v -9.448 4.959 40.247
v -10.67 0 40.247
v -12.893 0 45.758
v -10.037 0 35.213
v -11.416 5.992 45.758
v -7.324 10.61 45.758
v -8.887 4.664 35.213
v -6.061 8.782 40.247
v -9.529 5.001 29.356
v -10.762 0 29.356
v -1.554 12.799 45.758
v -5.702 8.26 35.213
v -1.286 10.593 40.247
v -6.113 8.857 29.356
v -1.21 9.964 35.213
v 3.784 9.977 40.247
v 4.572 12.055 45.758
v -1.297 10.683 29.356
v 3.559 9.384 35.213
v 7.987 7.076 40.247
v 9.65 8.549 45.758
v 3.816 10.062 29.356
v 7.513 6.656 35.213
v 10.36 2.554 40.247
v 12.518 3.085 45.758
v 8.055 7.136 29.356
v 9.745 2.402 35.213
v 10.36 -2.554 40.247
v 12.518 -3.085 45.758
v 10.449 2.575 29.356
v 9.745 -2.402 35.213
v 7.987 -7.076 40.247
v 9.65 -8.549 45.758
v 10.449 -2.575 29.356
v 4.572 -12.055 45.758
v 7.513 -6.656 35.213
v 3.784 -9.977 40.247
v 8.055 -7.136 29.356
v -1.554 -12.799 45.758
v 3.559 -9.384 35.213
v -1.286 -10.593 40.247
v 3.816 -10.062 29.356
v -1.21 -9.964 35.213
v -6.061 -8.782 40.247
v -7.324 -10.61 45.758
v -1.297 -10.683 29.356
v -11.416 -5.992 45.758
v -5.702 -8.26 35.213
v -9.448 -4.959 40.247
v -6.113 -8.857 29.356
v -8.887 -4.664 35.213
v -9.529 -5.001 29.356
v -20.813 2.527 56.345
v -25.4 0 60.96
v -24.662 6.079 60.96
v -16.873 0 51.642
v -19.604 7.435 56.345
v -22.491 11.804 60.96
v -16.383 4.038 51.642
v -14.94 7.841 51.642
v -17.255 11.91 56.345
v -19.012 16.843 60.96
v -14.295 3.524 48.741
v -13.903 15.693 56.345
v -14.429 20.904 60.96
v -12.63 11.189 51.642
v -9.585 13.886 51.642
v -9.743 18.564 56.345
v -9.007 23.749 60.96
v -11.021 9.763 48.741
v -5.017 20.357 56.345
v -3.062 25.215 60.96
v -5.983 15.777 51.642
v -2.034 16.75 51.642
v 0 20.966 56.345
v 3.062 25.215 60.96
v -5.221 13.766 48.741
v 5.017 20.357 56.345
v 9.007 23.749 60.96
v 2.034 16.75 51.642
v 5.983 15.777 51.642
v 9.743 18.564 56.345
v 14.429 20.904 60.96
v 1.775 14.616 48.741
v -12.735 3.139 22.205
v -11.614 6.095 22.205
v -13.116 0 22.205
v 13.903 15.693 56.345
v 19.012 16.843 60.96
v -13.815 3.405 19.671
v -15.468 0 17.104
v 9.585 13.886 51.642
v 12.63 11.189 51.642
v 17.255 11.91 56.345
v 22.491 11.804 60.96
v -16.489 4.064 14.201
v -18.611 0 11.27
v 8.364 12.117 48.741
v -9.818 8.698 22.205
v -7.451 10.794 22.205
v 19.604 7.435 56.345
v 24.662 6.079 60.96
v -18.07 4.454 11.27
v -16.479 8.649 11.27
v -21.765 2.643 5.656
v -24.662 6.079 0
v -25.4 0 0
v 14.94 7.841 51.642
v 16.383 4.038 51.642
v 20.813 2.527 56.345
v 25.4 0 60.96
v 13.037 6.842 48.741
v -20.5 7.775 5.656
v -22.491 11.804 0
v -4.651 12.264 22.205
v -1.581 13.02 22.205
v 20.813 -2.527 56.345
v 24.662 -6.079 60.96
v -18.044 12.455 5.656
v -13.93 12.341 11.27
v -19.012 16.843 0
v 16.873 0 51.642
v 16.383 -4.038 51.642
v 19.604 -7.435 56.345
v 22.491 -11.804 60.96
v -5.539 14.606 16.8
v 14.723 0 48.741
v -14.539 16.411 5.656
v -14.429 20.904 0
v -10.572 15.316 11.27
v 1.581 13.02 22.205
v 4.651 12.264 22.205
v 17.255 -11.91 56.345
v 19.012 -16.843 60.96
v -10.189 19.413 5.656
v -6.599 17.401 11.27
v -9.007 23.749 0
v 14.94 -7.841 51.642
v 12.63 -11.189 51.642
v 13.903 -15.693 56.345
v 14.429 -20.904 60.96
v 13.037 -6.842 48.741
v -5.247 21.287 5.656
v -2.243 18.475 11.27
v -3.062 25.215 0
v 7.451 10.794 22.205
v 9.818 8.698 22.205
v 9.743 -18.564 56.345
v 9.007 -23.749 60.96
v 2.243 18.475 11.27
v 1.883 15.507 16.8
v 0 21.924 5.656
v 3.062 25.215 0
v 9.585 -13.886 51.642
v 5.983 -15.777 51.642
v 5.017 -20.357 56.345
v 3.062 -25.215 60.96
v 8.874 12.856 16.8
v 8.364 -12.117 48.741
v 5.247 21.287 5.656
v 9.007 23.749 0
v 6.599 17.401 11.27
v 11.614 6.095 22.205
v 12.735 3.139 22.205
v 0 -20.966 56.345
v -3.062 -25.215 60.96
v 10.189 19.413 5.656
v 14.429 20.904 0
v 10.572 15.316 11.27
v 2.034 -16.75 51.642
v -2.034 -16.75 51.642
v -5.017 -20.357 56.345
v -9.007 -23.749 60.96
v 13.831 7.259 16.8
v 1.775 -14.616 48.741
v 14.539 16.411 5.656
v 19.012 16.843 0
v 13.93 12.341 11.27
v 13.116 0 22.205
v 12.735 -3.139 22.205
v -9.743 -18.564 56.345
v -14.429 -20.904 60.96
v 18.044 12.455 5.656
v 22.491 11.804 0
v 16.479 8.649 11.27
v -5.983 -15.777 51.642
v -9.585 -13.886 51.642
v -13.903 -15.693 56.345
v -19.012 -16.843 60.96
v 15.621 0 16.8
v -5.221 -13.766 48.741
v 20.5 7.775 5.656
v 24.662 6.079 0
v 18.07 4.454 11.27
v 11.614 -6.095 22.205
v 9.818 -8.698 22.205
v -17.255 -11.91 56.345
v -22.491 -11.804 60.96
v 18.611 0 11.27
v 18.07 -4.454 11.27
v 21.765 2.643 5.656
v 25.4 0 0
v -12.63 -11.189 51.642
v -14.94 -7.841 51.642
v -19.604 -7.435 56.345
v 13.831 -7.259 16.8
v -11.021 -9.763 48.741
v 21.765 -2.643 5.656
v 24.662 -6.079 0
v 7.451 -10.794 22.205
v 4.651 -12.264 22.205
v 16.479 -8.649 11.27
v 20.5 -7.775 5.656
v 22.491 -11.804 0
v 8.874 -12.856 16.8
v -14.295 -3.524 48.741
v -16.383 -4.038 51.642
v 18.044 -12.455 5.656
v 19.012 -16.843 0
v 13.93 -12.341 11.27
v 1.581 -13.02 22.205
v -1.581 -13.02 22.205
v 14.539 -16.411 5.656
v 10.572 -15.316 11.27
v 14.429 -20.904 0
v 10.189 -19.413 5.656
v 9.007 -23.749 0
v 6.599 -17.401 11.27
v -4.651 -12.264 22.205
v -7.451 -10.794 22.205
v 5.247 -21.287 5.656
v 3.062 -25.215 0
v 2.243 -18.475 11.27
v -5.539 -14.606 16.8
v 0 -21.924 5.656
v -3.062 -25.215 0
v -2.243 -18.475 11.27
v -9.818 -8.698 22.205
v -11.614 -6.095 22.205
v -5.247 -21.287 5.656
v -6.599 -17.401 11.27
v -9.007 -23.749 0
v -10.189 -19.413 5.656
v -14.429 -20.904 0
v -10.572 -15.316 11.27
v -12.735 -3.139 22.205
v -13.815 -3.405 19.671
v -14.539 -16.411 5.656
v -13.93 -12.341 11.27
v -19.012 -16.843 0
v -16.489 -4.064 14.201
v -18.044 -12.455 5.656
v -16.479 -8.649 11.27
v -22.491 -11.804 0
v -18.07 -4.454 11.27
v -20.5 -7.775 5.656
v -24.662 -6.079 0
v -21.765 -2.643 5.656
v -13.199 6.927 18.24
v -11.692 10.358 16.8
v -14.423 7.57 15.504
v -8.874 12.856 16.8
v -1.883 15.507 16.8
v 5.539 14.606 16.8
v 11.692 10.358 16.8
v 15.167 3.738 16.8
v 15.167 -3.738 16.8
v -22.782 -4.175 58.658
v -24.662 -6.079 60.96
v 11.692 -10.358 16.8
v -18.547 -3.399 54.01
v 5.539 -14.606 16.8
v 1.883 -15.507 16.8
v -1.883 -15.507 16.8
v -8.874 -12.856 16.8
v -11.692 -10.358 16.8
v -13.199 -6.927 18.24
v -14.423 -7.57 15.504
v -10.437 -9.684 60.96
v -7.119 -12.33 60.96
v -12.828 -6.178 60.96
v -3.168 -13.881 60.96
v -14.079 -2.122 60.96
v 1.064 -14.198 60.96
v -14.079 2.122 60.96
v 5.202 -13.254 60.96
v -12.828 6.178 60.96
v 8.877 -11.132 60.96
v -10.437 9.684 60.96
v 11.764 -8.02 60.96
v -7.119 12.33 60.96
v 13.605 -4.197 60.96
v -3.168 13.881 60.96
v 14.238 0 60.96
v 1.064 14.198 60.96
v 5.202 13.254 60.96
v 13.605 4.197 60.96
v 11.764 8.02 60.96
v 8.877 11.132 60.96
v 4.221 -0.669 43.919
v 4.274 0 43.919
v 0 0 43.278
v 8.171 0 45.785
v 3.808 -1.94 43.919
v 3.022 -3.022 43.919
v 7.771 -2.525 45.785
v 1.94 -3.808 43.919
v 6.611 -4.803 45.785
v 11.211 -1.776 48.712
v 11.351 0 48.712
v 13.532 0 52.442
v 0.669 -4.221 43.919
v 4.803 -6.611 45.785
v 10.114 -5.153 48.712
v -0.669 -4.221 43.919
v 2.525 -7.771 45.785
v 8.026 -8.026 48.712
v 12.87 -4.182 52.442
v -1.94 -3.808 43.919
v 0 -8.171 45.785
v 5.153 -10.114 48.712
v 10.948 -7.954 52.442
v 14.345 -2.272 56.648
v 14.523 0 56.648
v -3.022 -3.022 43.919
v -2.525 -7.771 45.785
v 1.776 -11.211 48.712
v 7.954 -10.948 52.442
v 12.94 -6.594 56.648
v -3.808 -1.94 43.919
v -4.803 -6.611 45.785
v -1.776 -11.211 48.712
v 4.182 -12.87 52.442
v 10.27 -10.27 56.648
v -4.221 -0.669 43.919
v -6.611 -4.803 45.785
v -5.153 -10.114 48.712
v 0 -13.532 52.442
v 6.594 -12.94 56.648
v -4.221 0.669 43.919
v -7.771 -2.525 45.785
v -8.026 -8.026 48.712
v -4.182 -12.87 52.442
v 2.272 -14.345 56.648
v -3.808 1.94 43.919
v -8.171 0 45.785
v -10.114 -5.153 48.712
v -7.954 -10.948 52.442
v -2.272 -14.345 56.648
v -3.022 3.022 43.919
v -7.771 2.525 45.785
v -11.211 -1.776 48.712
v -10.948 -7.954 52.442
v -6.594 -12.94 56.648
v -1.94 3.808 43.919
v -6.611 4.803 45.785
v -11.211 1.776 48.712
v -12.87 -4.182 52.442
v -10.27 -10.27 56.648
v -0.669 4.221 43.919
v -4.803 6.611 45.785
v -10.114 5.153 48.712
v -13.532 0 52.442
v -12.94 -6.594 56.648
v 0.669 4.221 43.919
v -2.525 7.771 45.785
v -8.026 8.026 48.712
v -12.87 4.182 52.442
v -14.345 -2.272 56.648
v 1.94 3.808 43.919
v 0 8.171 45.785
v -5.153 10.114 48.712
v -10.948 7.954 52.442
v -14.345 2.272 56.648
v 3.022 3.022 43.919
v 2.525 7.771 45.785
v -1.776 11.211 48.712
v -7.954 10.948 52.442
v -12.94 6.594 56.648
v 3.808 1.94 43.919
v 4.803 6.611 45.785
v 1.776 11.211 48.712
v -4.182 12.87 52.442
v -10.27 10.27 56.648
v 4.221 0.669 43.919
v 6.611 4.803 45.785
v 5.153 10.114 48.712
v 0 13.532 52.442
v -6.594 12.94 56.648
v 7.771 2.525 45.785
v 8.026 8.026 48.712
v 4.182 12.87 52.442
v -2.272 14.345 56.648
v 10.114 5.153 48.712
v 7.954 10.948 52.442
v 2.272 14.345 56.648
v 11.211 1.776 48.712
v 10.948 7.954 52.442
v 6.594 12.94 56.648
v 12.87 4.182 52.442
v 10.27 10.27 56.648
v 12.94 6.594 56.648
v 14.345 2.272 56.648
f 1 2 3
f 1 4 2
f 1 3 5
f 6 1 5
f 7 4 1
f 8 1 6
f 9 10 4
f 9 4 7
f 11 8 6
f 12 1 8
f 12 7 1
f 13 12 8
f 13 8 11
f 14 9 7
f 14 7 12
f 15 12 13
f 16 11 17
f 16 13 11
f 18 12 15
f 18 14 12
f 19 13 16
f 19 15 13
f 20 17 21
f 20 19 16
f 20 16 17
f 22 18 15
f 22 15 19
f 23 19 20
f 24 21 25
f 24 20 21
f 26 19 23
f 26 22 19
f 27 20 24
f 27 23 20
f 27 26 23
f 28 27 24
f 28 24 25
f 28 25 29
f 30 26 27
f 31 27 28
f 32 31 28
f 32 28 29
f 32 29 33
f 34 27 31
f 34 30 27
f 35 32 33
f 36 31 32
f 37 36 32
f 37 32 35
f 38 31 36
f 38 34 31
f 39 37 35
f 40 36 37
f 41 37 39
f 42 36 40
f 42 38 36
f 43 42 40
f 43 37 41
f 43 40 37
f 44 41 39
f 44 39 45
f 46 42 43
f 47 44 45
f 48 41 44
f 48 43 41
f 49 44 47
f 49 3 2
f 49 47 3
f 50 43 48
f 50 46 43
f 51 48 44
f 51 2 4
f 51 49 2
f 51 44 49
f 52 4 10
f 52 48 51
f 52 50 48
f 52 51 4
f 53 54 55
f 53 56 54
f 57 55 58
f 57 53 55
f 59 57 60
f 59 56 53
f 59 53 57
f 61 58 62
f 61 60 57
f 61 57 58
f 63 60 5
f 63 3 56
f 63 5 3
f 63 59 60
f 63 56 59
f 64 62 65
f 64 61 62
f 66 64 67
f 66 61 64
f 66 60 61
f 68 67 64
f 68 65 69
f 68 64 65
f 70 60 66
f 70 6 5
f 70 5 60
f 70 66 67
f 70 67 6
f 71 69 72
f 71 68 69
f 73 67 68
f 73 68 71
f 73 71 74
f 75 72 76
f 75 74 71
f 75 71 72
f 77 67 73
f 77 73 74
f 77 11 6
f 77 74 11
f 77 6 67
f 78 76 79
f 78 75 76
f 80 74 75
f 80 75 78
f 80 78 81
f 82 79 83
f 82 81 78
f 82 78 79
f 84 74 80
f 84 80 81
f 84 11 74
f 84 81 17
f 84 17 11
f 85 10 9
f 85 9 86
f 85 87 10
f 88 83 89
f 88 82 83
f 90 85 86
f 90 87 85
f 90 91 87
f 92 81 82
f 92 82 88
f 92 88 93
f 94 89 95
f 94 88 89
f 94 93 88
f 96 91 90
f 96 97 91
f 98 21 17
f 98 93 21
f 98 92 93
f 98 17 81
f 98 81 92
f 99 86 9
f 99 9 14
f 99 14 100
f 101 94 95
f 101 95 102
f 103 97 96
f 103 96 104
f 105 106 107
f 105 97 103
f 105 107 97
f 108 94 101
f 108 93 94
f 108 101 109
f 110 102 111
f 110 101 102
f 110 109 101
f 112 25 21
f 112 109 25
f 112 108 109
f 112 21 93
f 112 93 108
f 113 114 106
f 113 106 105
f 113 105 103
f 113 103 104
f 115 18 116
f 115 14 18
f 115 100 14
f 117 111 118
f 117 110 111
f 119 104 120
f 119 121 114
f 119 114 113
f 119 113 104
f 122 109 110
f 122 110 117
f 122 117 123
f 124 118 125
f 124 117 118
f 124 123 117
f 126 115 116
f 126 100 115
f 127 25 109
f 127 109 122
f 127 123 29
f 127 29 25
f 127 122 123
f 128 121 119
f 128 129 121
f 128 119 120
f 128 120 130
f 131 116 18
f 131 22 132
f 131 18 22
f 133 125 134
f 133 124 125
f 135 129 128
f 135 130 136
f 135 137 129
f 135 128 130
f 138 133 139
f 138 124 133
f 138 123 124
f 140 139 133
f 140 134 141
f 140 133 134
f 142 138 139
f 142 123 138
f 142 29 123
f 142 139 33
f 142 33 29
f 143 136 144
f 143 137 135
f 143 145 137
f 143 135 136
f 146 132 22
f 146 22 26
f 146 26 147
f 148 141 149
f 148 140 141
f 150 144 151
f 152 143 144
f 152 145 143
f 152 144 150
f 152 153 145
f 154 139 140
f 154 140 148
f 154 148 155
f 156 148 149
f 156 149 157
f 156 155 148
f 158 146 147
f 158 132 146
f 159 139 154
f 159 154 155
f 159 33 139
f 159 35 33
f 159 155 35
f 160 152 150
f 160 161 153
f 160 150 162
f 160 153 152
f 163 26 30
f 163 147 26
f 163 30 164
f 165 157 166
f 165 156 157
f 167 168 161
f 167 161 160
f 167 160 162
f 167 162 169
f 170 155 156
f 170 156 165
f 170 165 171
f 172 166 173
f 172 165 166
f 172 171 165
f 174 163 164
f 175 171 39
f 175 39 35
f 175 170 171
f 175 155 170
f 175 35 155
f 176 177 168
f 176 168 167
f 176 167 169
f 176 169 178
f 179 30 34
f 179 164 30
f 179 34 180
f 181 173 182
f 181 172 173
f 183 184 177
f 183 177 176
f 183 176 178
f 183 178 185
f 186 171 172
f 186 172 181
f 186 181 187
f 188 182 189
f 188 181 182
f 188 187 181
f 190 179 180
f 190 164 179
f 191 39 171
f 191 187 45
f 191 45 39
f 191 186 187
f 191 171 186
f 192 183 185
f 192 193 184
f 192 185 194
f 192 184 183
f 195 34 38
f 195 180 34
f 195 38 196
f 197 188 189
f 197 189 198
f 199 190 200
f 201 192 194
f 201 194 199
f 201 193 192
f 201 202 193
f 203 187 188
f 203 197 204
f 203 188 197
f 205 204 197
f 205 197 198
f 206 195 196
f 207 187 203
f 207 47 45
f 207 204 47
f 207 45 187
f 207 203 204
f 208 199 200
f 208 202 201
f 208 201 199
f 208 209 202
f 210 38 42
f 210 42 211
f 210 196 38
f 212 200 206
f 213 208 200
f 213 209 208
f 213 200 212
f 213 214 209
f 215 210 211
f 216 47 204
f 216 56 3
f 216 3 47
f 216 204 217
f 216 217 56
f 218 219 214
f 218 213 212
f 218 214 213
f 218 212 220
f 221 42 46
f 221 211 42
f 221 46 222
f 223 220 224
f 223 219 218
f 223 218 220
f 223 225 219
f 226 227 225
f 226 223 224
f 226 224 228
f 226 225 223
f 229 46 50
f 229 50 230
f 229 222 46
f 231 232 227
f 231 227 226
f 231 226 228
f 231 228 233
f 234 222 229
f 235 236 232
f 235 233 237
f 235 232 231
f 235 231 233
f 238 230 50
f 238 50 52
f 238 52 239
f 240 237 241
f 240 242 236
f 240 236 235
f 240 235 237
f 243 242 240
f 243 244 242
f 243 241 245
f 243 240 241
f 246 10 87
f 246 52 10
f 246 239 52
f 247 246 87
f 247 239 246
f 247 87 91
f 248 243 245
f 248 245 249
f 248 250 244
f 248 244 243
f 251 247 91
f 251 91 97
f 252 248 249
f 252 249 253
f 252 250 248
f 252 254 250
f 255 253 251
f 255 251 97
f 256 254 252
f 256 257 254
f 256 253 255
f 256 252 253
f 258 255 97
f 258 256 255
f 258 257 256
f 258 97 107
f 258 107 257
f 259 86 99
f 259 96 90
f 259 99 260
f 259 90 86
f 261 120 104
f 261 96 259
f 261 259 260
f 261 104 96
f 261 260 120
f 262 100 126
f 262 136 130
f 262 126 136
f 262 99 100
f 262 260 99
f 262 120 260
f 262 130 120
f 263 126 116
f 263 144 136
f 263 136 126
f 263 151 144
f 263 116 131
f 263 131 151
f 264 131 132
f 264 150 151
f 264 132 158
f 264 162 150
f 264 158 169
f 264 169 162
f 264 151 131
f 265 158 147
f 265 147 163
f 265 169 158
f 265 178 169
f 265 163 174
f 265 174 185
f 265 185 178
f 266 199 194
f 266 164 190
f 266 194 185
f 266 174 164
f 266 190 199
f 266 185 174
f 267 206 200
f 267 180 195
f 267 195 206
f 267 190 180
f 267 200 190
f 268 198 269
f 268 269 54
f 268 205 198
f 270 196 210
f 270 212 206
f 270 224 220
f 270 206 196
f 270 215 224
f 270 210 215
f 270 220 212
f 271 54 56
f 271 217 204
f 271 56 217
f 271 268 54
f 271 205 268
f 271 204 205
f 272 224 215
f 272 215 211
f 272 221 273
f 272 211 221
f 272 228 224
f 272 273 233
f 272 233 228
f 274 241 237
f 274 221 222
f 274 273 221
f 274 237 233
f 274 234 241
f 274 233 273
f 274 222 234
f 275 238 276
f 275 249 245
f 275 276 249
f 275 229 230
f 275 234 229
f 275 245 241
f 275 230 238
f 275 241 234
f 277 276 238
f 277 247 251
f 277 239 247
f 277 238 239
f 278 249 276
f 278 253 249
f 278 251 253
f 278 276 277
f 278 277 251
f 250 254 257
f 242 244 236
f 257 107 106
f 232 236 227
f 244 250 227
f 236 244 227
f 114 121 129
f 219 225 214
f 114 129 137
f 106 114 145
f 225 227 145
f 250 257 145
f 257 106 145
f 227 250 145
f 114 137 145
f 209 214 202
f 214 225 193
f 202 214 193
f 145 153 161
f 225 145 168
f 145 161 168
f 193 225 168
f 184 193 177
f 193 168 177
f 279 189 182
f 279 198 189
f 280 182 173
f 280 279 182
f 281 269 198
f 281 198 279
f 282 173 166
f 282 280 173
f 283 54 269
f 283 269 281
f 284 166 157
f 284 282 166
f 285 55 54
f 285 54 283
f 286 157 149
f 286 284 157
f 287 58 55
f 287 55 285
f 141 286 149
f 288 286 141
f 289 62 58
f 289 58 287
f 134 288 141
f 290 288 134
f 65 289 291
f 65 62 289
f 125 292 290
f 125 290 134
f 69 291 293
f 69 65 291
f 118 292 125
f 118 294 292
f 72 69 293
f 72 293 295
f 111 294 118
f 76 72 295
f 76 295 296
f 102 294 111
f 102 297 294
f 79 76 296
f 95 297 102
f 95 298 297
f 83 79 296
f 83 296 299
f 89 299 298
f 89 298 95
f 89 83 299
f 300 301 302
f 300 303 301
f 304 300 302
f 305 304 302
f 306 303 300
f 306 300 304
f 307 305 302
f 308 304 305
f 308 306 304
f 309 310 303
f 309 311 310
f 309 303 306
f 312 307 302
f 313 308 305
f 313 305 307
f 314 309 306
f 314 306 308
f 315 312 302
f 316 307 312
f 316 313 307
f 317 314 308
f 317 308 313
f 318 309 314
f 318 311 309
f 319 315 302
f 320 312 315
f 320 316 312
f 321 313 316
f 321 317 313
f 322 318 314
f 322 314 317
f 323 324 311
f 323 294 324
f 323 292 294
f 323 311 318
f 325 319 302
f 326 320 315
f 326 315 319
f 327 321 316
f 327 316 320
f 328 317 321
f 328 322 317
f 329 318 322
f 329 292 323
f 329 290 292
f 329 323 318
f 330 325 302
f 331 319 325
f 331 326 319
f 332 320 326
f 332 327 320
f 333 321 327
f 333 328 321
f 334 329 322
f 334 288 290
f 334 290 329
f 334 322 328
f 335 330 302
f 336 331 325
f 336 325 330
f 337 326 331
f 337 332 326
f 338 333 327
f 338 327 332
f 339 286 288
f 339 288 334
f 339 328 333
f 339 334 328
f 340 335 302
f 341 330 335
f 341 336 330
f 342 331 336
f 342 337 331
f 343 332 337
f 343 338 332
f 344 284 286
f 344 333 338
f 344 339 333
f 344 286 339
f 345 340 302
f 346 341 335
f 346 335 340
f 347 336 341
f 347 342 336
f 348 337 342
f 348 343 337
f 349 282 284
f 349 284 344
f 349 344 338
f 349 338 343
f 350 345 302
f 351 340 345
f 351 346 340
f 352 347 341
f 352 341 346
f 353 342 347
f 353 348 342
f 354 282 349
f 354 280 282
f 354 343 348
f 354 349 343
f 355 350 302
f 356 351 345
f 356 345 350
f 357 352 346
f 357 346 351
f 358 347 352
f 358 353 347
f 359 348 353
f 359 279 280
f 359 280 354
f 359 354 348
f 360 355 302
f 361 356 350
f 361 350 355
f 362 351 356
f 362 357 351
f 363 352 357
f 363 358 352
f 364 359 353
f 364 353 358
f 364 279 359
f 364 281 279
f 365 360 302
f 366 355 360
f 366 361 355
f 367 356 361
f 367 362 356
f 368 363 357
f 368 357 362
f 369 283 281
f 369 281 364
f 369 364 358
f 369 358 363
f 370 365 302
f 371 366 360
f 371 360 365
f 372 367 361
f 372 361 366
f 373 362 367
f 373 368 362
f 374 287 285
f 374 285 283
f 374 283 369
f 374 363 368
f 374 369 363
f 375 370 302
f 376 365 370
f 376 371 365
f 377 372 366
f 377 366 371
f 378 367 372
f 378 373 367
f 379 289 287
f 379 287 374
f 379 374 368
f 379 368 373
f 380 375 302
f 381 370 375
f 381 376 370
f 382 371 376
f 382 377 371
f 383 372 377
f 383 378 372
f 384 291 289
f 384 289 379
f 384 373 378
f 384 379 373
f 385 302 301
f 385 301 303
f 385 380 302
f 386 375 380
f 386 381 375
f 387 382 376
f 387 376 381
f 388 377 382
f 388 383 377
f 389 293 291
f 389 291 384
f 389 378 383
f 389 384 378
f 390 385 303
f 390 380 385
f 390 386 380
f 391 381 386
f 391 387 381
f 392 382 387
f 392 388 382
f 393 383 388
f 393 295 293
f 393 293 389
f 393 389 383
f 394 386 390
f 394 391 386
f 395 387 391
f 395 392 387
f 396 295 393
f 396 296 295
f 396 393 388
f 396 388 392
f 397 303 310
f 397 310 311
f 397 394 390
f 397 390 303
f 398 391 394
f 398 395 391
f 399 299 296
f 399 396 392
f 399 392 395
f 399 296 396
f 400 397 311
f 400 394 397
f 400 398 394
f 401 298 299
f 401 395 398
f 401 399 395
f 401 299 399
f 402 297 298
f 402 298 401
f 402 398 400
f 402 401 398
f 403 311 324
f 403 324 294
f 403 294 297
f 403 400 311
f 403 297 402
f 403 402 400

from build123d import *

# Parameters (mm, degrees)
F0_R     = 25.4
F1_DEPTH = 60.96


with BuildPart() as f1:
    # F0 (on Top) → F1 (new body)
    with BuildSketch(Plane.XY):
        Circle(F0_R)
    extrude(amount=F1_DEPTH)

    # F2 (on Front) → F3 (revolve, cut)
    with BuildSketch(Plane.XZ):
        with BuildLine():
            add(Edge.make_bspline(
                [(-25.4, 60.96), (-18.161229299, 53.5449746307), (-2.3189550459, 37.3169615682), (-17.2768036824, 13.1334177199), (-25.4, 0)],
                knots=[0, 0, 0, 0, 0.4569274957, 1, 1, 1, 1], degree=3))
            Line((-25.4, 60.96), (-25.4, 0))
        make_face()
    revolve(axis=Axis((0, 0, 24.8525852567), (0, 0, -1)), mode=Mode.SUBTRACT)

    # F4 (on Front) → F5 (revolve, cut)
    with BuildSketch(Plane.XZ):
        with BuildLine():
            Line((0, 72.4249499515), (0, 43.2784614488))
            ThreePointArc((0, 43.2784614488), (14.5732442514, 57.8517057002), (0, 72.4249499515))
        make_face()
    revolve(axis=Axis((0, 0, 57.8517057002), (0, 0, -1)), mode=Mode.SUBTRACT)


solid = f1.part
